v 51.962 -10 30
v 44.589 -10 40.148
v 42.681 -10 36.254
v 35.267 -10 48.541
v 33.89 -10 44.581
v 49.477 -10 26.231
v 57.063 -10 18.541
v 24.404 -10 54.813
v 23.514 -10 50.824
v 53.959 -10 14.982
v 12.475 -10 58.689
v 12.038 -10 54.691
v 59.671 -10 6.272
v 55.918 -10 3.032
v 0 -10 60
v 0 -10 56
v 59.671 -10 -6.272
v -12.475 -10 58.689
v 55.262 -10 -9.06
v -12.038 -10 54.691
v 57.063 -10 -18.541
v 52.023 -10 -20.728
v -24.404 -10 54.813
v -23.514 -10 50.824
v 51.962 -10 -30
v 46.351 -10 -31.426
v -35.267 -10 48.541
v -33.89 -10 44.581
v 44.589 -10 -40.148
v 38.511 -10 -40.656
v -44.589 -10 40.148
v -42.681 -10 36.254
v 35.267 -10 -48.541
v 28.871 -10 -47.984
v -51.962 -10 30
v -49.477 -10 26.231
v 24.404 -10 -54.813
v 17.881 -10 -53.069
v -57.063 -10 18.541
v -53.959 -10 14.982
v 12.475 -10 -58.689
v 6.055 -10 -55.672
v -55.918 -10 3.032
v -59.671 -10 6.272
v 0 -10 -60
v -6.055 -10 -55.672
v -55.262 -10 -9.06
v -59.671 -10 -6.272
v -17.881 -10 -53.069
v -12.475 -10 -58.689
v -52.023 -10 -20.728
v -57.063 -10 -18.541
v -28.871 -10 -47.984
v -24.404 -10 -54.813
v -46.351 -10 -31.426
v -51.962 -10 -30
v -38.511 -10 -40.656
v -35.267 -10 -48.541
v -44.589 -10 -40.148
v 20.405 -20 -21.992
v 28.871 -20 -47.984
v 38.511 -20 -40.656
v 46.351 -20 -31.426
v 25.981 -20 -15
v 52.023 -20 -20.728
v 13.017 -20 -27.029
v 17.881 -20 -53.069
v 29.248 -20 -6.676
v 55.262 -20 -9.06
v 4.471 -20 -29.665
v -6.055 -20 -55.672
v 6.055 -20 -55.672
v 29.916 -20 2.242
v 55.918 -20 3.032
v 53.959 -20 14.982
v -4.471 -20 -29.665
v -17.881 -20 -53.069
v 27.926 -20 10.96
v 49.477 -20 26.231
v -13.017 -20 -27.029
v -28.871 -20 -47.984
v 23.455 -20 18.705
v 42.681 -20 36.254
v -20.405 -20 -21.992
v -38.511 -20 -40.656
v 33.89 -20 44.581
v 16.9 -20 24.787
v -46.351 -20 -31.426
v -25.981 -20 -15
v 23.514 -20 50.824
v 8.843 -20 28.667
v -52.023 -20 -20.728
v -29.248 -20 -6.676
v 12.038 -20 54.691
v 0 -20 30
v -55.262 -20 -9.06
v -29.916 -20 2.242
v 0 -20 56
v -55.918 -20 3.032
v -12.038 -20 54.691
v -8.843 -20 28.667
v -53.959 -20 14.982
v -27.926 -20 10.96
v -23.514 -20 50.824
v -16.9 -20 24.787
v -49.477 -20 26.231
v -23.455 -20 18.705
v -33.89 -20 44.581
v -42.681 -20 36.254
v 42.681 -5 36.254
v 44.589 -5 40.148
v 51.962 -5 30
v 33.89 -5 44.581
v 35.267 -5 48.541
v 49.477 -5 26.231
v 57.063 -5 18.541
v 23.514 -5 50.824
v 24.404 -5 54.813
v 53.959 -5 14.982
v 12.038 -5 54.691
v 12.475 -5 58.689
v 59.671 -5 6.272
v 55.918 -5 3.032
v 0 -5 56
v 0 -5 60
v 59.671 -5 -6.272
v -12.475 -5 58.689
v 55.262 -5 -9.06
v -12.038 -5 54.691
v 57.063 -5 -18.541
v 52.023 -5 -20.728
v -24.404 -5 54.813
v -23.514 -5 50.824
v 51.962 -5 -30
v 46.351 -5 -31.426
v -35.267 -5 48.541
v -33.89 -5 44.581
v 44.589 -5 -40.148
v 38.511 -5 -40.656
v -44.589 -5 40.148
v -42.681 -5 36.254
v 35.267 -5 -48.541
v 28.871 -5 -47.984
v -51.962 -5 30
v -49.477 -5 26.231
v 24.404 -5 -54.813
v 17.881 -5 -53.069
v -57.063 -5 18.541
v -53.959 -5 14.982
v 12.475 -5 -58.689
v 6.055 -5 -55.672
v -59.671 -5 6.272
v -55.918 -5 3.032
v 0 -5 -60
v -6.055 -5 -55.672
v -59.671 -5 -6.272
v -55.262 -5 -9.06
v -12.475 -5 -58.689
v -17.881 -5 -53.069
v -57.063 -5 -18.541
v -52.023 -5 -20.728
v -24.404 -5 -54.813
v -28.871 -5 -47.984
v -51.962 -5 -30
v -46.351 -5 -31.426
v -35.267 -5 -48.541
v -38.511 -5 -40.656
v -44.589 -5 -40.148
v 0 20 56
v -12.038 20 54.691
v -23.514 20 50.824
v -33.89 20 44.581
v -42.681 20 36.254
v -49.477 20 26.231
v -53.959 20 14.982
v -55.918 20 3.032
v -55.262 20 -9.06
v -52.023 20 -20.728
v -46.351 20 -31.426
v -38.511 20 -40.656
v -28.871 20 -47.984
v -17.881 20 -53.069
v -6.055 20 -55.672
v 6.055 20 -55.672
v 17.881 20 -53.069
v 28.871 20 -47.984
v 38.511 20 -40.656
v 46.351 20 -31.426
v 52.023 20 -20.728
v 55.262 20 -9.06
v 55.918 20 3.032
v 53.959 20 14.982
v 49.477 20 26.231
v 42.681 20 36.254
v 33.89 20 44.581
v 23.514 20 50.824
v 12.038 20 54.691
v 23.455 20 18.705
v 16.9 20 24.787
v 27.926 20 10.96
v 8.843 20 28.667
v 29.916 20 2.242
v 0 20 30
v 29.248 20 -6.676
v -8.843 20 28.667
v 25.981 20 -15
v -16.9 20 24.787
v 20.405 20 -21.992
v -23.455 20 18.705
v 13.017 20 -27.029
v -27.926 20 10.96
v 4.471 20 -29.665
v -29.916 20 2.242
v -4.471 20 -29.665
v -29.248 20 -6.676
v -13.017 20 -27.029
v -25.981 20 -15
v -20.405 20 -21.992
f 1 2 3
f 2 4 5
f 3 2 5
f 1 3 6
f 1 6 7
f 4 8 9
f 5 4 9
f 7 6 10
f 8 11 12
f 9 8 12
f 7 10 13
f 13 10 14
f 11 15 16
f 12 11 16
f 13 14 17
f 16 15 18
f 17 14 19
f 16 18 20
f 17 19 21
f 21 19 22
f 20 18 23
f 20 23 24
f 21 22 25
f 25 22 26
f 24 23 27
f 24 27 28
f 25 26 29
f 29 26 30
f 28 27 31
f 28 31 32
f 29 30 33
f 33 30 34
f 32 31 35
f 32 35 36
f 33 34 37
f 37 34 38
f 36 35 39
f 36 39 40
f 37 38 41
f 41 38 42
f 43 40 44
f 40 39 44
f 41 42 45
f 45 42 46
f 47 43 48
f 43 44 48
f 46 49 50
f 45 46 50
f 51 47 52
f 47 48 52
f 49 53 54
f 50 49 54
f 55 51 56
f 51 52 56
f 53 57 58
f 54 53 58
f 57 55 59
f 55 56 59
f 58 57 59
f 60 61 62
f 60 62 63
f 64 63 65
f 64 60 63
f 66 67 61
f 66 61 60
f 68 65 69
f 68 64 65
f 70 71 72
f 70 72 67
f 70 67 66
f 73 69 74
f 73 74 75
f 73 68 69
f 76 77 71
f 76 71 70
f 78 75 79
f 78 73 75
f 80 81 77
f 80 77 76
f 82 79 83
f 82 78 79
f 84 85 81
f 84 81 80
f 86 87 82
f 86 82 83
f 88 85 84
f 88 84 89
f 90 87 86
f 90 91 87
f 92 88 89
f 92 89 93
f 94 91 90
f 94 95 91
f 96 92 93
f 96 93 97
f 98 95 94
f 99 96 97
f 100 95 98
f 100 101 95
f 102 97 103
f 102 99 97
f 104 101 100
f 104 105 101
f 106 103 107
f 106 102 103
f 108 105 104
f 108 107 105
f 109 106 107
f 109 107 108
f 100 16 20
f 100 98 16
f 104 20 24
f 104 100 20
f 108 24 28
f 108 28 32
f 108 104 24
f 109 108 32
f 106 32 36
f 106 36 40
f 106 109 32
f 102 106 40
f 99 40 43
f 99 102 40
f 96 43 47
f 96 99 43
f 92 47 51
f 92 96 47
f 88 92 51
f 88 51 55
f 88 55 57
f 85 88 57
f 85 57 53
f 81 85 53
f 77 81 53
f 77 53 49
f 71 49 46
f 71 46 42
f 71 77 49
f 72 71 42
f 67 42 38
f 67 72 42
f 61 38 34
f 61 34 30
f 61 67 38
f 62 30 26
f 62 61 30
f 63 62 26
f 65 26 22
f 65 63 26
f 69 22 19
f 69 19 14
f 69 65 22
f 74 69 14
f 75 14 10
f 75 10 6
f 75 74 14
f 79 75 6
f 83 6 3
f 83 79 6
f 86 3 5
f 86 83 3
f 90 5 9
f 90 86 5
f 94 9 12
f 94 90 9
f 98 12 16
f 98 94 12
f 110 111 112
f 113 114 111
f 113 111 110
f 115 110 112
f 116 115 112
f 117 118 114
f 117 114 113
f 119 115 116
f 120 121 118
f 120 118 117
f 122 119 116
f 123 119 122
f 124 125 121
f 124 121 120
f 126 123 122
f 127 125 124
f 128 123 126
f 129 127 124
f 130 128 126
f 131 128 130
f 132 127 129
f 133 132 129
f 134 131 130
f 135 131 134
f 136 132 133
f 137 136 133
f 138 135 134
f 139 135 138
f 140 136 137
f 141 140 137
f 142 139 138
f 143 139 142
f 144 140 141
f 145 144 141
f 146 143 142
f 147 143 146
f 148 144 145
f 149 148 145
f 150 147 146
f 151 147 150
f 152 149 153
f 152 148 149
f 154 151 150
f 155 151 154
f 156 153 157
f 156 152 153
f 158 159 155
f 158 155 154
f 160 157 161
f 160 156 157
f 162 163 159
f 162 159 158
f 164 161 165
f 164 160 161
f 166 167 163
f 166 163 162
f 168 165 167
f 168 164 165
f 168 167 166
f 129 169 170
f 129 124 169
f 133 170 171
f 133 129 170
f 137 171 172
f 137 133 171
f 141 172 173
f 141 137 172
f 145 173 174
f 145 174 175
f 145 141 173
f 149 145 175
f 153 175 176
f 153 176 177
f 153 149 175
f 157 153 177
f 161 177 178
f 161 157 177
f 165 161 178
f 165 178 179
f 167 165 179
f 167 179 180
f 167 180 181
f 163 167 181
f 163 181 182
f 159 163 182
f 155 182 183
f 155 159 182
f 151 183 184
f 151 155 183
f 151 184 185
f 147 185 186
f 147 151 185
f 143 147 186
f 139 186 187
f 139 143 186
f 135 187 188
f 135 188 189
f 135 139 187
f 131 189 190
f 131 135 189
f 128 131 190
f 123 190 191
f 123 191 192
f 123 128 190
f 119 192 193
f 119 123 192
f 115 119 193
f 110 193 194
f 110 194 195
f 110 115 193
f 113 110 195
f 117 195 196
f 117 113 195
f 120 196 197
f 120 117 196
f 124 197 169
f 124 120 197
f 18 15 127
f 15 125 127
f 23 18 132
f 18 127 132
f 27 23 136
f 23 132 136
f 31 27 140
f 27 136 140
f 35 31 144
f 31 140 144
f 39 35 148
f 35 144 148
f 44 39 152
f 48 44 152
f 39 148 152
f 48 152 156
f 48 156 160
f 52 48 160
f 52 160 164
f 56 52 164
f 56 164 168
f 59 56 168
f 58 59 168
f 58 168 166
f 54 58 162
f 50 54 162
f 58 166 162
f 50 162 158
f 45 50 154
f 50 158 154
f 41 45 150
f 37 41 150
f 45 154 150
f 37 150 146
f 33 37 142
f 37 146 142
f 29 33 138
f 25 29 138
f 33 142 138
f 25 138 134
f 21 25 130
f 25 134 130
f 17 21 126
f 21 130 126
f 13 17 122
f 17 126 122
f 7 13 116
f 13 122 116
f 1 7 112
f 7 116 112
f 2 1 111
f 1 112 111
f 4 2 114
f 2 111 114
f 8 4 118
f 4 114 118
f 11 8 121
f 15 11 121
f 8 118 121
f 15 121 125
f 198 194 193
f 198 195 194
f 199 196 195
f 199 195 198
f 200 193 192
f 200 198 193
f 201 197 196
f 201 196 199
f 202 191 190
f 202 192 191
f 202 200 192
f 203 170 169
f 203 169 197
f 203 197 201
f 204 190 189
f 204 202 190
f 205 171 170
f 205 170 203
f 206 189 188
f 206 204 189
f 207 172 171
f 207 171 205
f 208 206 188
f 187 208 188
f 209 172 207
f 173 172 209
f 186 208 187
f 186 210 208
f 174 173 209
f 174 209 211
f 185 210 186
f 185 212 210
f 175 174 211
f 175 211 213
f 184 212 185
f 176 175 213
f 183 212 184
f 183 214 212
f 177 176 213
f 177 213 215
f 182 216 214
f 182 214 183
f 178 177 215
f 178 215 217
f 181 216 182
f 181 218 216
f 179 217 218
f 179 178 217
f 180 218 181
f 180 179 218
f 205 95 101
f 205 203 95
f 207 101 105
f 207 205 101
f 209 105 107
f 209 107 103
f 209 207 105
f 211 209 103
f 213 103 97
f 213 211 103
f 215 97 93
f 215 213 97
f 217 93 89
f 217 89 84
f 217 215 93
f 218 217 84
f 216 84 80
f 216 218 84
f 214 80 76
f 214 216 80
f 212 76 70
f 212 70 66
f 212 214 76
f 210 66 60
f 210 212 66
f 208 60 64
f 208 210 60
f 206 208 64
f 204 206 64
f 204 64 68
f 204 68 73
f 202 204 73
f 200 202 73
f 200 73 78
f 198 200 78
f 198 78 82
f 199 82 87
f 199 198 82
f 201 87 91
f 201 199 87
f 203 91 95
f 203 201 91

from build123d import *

# Parameters (mm, degrees)
F0_W = 5
F0_H = 4


with BuildPart() as f1:
    # F0 (on Right) → F1 (revolve)
    with BuildSketch(Plane.YZ):
        Polygon((-10, 56), (-20, 56), (-20, 30), (20, 30), (20, 56), (-5, 56), align=None)
        with Locations((-7.5, 58)):
            Rectangle(F0_W, F0_H)
    revolve(axis=Axis((0, -1.266651, 0), (0, -1, 0)))


solid = f1.part
